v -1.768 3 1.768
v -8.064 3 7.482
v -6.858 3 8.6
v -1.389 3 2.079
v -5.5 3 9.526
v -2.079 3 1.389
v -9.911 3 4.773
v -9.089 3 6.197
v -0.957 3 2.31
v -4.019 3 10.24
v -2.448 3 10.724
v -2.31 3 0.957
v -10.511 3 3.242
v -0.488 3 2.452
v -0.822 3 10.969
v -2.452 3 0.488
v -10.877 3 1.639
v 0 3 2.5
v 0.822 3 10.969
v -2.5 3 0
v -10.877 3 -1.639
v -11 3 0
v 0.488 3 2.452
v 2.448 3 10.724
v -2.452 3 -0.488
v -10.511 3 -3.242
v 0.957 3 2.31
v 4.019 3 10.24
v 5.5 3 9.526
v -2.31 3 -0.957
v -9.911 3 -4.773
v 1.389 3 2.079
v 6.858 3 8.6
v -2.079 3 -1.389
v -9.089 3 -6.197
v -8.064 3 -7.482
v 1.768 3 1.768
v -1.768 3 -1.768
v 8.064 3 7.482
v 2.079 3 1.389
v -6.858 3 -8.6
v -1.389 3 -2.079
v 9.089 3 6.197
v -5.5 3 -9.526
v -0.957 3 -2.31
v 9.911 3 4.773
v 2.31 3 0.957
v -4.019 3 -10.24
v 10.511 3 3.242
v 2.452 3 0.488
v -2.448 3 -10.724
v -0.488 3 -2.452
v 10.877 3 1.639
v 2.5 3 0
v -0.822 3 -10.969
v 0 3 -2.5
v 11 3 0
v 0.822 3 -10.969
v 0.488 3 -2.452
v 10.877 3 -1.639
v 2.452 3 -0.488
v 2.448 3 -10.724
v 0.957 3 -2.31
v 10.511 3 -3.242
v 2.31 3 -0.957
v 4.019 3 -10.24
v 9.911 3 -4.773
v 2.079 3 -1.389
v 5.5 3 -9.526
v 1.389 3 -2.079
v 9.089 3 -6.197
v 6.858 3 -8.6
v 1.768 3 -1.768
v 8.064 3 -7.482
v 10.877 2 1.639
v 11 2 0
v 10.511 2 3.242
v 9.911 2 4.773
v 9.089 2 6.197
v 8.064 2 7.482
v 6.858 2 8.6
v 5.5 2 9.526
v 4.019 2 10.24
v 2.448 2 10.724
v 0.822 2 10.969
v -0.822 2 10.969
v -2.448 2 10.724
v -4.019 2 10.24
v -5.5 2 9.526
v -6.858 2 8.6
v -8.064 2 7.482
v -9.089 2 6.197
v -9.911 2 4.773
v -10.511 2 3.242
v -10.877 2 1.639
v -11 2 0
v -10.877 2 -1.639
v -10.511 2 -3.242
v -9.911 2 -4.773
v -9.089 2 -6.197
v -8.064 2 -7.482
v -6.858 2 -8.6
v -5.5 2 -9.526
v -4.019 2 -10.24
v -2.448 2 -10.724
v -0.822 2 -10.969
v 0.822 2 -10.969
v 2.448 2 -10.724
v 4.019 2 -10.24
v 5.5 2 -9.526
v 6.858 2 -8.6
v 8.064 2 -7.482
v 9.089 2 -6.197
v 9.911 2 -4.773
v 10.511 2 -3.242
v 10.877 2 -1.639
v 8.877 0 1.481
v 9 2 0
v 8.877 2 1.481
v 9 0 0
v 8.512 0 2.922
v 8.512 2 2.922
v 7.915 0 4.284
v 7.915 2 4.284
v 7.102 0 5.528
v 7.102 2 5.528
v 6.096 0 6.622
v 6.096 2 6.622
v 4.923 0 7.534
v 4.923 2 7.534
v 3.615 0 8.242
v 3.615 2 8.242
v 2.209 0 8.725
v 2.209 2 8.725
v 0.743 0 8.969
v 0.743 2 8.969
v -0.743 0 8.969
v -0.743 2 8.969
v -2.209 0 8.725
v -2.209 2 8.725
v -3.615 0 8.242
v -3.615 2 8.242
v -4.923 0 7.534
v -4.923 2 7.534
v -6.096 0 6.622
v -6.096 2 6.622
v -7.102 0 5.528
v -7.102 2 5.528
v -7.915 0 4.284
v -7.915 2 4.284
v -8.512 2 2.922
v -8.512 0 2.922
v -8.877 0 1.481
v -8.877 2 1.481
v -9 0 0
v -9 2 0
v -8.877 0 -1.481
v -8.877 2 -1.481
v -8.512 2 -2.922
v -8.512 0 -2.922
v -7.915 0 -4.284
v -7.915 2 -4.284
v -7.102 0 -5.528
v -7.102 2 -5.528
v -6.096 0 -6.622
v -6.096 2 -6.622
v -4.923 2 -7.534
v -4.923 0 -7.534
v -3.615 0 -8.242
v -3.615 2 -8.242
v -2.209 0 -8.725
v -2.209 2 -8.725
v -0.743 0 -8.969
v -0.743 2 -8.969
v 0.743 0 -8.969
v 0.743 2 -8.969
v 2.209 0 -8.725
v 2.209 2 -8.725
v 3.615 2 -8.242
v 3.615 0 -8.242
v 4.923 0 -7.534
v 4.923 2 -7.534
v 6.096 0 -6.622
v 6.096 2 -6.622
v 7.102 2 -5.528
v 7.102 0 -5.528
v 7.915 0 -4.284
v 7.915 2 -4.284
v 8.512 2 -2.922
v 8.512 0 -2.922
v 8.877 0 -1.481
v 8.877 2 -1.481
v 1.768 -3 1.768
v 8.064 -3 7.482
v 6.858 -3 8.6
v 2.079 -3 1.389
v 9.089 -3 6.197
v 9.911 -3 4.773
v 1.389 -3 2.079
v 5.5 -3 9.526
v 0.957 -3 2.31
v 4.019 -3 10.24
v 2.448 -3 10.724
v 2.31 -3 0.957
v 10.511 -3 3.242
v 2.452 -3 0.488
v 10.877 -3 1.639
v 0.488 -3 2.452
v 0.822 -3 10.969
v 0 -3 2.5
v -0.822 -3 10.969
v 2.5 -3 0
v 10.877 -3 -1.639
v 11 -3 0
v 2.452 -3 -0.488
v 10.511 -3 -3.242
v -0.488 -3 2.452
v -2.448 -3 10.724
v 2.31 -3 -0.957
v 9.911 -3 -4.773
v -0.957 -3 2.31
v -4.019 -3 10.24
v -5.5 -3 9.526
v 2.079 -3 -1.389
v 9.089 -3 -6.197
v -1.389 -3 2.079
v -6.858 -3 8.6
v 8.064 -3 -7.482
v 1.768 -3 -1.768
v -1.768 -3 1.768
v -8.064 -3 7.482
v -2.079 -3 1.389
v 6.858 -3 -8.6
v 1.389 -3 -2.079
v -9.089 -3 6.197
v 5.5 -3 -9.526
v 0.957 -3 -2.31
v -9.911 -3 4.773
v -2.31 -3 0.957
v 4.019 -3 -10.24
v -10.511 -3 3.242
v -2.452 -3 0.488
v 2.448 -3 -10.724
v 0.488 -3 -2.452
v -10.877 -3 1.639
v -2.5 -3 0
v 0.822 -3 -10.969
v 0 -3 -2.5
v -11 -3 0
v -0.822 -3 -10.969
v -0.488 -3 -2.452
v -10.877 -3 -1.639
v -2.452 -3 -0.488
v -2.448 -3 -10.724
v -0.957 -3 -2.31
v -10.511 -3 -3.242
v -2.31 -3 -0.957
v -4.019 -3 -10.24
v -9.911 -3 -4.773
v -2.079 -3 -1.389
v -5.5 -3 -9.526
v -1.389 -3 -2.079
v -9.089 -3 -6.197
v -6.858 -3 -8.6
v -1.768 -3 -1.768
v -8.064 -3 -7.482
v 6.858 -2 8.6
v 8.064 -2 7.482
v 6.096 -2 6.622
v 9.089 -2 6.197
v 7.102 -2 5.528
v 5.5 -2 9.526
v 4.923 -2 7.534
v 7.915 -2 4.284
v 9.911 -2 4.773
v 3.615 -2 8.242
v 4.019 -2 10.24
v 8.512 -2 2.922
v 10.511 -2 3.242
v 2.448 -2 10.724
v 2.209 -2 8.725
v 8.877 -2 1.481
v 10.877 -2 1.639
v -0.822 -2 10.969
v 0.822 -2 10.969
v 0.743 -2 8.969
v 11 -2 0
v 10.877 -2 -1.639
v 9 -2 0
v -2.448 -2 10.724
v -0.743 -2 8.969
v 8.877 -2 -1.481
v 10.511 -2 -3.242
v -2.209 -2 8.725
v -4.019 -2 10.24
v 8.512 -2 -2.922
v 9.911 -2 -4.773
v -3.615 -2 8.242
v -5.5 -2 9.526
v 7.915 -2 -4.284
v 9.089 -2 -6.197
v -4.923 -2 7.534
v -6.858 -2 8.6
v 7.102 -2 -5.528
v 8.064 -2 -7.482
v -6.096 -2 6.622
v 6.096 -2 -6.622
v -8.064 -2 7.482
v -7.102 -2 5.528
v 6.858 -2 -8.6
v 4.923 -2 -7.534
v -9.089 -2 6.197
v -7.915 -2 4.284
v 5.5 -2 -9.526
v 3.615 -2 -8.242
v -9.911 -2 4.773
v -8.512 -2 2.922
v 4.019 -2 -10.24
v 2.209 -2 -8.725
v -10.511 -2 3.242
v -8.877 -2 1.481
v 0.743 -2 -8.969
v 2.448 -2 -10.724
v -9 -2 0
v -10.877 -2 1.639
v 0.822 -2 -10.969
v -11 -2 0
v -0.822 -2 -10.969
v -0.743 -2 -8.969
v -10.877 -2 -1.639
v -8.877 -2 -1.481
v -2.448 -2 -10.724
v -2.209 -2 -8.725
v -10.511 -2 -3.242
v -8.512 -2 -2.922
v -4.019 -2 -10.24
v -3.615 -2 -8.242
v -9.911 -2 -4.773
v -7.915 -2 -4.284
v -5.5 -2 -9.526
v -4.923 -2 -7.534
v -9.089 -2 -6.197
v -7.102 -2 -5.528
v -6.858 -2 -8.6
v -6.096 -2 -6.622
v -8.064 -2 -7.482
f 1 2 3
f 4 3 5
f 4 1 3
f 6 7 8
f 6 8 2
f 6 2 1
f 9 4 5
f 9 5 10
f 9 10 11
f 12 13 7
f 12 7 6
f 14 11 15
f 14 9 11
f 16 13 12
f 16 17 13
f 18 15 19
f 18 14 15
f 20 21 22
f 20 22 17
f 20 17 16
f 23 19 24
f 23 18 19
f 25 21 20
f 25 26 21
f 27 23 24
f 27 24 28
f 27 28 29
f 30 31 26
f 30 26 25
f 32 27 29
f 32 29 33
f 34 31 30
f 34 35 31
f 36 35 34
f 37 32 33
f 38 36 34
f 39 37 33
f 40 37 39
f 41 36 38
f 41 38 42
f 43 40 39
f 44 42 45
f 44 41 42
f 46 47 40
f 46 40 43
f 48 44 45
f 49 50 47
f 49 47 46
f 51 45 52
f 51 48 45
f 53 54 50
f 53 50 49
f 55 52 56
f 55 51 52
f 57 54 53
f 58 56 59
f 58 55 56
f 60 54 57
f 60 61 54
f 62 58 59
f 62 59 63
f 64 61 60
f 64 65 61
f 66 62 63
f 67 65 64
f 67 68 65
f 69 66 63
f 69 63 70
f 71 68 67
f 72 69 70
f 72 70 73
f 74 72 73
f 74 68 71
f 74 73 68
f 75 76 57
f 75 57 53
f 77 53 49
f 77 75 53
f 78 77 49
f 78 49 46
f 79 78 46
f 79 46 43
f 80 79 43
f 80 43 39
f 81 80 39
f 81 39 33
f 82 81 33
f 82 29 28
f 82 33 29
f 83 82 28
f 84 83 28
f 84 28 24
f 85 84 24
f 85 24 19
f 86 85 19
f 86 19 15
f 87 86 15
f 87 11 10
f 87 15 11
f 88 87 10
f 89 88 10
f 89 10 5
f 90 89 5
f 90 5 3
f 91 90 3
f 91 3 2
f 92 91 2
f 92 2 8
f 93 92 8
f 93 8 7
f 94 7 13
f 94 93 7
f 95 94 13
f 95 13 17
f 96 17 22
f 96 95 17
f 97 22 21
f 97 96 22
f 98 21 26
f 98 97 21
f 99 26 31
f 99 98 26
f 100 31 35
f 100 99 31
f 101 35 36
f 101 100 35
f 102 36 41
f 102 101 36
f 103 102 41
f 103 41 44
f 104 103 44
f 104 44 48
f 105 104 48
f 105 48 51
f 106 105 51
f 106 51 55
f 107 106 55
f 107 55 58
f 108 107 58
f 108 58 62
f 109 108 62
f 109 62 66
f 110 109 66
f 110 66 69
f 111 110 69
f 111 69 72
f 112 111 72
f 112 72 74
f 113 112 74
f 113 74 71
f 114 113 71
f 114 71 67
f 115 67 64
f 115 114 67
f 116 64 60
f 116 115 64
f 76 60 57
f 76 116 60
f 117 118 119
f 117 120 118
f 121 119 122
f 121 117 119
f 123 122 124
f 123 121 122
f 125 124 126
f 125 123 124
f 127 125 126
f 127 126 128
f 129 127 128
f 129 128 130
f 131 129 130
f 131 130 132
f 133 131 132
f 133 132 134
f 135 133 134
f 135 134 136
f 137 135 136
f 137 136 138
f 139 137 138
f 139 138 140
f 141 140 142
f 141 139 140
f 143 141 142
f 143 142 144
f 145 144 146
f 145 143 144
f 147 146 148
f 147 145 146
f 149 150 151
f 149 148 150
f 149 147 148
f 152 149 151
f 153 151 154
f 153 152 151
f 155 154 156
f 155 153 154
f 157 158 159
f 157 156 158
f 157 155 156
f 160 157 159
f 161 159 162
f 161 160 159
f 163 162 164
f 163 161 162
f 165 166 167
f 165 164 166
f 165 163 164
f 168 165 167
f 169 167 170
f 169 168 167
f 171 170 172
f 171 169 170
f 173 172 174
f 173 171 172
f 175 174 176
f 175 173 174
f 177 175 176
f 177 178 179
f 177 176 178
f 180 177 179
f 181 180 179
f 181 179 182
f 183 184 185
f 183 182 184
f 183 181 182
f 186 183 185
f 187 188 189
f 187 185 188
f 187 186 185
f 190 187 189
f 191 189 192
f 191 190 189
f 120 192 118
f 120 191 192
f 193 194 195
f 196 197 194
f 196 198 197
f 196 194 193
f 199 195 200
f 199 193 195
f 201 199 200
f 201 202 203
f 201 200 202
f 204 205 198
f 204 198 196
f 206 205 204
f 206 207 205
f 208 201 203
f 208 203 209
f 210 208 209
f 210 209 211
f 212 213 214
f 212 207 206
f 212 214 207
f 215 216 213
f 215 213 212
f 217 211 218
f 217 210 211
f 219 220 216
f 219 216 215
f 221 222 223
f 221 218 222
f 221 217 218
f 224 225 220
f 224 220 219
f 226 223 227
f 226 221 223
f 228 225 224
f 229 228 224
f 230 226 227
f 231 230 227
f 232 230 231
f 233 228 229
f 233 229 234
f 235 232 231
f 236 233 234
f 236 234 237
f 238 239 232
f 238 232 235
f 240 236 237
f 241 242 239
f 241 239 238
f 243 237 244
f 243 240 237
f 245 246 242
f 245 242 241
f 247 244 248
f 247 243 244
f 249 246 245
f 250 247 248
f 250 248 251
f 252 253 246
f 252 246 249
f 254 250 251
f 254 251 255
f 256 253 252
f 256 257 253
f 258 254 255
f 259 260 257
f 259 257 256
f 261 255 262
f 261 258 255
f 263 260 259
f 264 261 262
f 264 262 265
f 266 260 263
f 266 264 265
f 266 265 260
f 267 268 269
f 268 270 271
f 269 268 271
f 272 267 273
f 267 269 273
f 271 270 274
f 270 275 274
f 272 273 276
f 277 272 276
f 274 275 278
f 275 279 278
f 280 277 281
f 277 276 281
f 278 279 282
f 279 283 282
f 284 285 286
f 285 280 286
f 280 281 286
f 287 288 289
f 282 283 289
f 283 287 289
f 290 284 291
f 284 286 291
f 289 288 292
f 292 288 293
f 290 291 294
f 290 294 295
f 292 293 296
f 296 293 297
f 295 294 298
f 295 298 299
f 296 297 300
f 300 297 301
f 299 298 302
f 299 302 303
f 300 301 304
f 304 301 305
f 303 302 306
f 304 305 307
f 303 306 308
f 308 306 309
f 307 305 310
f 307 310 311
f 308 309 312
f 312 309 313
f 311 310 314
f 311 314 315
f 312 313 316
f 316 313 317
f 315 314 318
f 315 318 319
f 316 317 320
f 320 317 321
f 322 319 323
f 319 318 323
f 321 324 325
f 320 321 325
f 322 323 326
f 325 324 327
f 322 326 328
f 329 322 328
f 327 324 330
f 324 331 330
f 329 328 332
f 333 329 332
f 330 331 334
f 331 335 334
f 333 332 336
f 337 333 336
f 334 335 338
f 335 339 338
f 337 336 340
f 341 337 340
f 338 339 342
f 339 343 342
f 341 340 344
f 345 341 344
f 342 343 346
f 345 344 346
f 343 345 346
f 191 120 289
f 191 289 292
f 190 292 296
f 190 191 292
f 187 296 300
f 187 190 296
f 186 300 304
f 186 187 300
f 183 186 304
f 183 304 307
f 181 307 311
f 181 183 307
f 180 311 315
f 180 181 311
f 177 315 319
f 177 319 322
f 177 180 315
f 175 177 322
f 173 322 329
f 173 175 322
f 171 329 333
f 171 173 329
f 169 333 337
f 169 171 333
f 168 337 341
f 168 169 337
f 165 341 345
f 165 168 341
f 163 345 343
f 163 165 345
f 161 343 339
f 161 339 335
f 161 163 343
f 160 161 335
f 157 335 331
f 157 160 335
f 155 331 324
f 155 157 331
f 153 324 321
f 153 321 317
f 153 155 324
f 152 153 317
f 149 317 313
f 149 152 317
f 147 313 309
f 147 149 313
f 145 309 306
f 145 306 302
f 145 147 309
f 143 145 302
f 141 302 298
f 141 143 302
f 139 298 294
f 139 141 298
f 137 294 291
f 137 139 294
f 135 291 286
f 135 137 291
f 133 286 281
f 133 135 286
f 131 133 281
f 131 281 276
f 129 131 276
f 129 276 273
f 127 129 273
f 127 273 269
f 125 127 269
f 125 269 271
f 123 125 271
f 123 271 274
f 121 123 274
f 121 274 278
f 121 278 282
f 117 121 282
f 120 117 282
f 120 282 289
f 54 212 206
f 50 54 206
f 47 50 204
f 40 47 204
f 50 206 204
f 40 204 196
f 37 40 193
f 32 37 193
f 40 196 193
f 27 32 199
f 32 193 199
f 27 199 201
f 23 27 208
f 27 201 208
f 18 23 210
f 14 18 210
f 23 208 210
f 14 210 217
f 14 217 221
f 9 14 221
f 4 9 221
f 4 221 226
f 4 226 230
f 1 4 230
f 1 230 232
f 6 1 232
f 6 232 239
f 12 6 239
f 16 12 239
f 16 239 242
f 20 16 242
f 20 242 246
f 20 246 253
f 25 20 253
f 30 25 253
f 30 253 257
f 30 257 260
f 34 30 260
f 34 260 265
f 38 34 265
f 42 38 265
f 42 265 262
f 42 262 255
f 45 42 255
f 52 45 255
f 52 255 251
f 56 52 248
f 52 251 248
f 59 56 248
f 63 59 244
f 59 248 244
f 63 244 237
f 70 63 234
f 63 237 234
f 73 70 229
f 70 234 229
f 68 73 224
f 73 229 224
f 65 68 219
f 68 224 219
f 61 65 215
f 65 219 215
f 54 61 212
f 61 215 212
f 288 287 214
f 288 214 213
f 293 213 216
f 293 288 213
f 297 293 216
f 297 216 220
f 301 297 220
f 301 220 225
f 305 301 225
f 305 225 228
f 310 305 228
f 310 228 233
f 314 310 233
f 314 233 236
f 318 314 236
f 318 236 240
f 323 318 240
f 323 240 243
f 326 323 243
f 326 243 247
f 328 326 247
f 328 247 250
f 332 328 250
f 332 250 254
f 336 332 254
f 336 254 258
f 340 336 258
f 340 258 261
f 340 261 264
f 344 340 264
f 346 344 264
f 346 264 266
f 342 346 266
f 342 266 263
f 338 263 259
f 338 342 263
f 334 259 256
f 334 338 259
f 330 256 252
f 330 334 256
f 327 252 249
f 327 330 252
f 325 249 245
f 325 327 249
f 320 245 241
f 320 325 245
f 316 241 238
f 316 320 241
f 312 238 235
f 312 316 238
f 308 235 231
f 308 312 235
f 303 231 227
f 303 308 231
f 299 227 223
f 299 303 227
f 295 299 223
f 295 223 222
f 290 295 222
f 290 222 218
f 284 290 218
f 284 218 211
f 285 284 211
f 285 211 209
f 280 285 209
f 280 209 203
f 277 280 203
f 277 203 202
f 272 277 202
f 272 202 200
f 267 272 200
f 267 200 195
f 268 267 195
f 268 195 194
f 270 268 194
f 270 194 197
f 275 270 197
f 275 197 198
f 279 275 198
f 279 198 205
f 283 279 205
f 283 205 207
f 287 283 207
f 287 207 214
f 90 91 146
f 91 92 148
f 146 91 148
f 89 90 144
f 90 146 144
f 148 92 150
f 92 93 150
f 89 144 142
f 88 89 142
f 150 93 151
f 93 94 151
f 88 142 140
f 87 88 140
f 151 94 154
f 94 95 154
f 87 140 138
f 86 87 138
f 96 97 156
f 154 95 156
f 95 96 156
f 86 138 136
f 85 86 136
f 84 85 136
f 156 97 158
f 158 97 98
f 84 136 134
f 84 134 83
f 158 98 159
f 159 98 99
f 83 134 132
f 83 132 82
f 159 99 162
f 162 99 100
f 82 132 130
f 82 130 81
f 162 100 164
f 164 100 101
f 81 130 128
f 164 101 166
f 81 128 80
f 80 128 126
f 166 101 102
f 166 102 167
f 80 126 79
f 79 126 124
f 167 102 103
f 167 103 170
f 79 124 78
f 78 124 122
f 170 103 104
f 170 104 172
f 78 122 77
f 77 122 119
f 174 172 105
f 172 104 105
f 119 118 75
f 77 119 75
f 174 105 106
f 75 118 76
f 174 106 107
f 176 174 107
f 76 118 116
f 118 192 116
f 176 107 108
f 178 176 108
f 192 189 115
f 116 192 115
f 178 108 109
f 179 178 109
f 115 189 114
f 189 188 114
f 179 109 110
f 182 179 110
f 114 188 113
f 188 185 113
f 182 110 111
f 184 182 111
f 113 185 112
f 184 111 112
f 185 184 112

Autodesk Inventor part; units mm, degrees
ref_plane "YZ Plane" through (0, 0, 0) normal (1, 0, 0) x (0, 1, 0)
ref_plane "XZ Plane" through (0, 0, 0) normal (0, 1, 0) x (-1, 0, 0)
ref_plane "XY Plane" through (0, 0, 0) normal (0, 0, 1) x (1, 0, 0)
sketch "Sketch1" plane through (0, 0, 0) normal (0, 0, 1) x (1, 0, 0)
  line L0 (0, 3) -> (9, 3)
  line L1 (9, 3) -> (9, 0)
  line L2 (9, 0) -> (0, 0)
  line L3 (0, 0) -> (0, 3)
  line L4 (0, 3) -> (11, 3)
  line L5 (11, 3) -> (11, 2)
  line L6 (11, 2) -> (0, 2)
  line L7 (0, 2) -> (0, 3)
  point P0 (9, 2)
  dimension "d0" = 9
  dimension "d1" = 3
  dimension "d2" = 11
  dimension "d3" = 1
  dimension "d8" = 2
revolve "Revolution1" add sketch "Sketch1" angle 360 about axis through (0, 0, 0) along (0, 1, 0)
mirror "Mirror1" about plane through (0, 0, 0) normal (0, 1, 0) of "Revolution1"
sketch "Sketch2" plane through (0, -3, 0) normal (0, -1, 0) x (1, 0, 0)
  circle A0 centre (0, 0) radius 2.5
  point P0 (0, 0)
  dimension "d5" = 5
extrude "Extrusion1" cut sketch "Sketch2" against normal blind 10
properties part number "stove_pulley"
